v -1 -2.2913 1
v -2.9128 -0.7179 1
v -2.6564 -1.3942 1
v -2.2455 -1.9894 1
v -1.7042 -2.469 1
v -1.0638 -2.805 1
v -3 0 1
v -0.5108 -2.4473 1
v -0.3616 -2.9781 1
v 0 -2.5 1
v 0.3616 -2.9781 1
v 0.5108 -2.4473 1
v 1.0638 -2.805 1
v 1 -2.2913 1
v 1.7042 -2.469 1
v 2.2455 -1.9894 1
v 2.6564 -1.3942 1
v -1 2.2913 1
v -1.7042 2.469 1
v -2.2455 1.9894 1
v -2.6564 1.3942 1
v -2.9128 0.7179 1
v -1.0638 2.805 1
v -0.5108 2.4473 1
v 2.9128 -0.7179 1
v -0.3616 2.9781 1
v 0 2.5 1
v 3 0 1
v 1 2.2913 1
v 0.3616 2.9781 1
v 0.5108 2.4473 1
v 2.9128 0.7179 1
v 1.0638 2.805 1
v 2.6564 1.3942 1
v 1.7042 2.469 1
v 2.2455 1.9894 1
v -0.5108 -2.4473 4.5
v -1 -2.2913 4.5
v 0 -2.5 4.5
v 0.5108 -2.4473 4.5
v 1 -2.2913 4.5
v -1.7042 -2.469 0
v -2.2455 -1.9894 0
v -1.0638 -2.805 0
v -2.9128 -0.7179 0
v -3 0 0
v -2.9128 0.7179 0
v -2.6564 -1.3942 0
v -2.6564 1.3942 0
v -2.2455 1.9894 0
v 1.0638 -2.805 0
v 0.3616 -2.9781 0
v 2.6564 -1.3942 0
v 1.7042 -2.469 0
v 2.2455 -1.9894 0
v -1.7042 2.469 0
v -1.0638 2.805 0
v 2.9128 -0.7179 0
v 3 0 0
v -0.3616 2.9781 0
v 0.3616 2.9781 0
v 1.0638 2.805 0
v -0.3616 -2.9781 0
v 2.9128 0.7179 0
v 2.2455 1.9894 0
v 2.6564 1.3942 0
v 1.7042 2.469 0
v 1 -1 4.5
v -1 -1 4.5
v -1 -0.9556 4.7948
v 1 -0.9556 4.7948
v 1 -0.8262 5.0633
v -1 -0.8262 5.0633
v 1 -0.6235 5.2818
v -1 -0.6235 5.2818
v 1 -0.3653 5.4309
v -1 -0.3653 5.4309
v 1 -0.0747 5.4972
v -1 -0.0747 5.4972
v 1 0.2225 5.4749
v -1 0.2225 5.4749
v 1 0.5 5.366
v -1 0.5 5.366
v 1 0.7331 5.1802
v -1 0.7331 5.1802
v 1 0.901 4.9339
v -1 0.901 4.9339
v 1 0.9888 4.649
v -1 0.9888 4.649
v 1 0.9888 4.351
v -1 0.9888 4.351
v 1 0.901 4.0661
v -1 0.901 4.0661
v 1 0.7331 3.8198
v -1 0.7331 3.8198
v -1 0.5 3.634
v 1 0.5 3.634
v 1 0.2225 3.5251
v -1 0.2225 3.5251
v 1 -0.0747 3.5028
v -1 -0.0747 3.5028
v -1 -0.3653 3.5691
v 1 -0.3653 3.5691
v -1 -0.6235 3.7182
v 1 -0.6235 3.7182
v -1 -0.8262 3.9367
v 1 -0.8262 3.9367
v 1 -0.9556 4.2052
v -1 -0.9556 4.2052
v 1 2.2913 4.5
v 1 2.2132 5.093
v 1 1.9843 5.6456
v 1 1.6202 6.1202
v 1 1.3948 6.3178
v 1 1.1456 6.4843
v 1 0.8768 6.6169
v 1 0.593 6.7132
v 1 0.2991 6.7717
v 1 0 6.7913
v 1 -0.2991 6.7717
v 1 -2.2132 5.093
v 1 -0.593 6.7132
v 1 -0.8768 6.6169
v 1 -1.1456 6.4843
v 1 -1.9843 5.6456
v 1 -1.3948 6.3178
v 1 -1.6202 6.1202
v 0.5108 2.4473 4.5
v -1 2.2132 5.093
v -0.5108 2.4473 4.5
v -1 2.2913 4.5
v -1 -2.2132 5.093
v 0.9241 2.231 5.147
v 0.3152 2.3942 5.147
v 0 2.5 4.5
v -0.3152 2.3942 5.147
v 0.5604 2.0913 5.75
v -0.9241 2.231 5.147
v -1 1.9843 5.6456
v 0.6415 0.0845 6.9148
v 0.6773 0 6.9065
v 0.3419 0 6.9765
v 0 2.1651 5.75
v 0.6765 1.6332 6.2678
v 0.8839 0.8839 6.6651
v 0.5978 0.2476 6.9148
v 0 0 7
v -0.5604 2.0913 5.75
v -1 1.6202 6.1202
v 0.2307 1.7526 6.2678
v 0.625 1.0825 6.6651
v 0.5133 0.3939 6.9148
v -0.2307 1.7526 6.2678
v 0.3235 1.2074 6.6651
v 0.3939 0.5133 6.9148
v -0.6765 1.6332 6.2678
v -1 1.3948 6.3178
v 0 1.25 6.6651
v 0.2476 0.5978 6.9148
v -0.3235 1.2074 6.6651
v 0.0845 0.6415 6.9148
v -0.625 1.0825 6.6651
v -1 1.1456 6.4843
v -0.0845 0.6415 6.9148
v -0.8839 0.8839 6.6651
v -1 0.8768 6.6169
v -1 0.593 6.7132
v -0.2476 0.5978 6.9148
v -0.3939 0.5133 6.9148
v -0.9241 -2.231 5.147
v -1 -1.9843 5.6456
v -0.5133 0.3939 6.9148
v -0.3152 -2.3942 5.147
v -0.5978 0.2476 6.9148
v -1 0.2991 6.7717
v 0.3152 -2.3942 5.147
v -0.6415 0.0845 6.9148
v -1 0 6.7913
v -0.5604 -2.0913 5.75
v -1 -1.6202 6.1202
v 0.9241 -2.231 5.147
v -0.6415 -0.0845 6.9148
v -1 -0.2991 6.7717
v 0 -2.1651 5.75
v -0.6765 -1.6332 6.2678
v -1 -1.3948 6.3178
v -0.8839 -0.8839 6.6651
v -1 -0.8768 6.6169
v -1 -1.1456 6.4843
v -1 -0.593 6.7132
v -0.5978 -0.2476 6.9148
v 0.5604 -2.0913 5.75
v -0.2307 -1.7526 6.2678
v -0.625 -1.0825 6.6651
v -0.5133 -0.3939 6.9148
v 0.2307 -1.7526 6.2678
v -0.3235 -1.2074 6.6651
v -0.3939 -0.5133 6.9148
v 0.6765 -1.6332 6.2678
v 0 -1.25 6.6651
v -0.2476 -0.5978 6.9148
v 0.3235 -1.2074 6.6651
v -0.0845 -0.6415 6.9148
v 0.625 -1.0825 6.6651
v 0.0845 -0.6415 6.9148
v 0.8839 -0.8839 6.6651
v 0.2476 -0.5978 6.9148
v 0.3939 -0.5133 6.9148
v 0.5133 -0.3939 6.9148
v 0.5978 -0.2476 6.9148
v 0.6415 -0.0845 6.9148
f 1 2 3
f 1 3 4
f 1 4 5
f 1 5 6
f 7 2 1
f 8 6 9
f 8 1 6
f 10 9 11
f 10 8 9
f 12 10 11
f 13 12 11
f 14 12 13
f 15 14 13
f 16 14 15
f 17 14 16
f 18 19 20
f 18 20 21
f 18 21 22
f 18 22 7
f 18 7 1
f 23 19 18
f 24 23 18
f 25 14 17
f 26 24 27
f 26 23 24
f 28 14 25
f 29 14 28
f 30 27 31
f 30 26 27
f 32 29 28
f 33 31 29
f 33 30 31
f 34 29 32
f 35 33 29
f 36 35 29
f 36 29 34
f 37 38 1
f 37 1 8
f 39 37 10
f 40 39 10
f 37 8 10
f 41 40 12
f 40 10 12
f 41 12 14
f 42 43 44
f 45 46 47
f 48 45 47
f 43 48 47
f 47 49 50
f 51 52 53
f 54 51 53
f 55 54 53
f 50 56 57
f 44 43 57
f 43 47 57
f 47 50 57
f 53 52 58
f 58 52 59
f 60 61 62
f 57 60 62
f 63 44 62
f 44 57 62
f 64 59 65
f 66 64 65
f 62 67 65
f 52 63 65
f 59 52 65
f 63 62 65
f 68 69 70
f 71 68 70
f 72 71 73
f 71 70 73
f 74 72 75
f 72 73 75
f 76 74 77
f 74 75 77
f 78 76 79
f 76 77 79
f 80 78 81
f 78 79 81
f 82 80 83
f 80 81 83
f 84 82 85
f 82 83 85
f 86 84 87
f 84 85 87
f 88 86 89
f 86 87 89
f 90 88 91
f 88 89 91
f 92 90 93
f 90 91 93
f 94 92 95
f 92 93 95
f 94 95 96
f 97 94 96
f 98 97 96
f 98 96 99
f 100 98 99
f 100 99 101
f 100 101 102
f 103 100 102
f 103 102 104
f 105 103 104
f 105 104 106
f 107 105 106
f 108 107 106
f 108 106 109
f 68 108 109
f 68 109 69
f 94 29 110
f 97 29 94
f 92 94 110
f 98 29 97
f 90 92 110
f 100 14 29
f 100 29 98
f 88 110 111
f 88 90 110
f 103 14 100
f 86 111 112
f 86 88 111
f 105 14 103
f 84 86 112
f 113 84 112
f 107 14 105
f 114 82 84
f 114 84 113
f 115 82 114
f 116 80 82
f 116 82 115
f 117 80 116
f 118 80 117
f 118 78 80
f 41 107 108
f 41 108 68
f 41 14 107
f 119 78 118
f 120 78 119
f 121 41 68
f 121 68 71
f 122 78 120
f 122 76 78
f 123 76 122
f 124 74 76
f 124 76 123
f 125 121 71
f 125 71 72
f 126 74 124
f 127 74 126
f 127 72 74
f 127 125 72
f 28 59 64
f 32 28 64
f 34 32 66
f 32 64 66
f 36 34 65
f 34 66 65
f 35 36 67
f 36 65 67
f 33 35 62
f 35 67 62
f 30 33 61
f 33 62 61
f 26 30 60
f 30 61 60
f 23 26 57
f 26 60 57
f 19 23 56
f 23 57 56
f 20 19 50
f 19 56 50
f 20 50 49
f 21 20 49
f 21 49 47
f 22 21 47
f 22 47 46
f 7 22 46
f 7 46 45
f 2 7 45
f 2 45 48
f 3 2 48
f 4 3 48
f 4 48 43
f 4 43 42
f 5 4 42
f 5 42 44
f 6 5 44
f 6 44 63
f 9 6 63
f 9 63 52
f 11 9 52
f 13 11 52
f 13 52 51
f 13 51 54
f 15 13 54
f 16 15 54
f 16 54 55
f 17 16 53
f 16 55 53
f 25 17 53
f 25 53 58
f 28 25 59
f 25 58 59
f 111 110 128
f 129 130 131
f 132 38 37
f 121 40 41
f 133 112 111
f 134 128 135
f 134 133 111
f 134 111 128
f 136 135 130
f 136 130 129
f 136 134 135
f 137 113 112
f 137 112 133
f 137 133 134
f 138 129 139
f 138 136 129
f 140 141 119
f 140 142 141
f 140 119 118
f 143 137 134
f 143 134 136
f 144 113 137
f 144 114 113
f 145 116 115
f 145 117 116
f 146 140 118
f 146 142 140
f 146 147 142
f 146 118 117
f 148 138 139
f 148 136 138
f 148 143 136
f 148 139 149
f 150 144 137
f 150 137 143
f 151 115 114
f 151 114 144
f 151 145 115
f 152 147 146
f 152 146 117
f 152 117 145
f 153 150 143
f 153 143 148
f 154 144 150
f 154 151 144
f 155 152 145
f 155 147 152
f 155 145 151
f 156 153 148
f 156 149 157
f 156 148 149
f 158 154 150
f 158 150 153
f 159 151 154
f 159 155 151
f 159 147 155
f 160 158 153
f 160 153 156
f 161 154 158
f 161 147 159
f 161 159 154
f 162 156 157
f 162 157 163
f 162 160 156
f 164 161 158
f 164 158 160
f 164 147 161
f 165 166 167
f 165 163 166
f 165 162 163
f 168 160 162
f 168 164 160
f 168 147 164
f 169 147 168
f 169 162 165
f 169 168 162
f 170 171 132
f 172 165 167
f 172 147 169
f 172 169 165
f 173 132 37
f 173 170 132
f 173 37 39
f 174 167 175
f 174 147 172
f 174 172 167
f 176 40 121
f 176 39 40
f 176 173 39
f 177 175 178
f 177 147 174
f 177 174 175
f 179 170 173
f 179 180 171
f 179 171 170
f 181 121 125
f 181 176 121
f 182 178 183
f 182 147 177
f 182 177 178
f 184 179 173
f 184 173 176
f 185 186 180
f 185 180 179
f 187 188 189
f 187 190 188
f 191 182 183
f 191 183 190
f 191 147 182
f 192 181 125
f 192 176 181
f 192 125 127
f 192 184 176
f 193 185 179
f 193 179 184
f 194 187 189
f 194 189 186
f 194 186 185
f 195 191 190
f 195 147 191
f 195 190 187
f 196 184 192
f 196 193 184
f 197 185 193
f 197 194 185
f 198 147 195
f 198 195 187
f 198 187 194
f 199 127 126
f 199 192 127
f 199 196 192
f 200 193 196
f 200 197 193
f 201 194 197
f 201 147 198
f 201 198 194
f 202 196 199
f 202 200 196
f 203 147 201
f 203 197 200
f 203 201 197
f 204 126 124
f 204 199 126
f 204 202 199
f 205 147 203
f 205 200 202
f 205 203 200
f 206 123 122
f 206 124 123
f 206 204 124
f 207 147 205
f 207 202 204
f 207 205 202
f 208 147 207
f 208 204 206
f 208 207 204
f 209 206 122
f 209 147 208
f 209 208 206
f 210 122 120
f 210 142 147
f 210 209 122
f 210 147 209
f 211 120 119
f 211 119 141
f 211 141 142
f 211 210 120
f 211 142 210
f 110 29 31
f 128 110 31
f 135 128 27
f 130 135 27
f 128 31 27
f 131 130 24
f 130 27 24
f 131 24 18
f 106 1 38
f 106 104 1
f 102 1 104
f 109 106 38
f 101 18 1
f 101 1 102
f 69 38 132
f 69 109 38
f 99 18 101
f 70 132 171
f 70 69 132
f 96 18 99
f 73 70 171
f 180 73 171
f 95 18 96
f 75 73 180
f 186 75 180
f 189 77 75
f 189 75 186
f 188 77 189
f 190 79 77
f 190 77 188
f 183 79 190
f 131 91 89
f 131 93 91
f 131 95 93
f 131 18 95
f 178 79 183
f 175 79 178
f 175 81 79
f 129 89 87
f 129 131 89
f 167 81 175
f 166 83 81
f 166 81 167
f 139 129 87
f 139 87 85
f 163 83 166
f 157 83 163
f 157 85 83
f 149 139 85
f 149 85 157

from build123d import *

# Parameters (mm, degrees)
F0_R     = 3
F1_DEPTH = 1
F2_R     = 2.5
F3_DEPTH = 6
F4_R     = 2.5
F5_W     = 1.9698908329
F5_H     = 6.6161441393
F5_W_2   = 2.2700465526
F6_DEPTH = 12.5
F7_R     = 1
F8_DEPTH = 4.001


with BuildPart() as f1:
    # F0 (on Top) → F1 (new body)
    with BuildSketch(Plane.XY):
        Circle(F0_R)
    extrude(amount=F1_DEPTH)

    # F2 (on face) → F3 (join)
    with BuildSketch(Plane.XY.offset(1)):
        Circle(F2_R)
    extrude(amount=F3_DEPTH)

    # F4
    f4_edges = [f1.edges().sort_by_distance(p)[0] for p in [
        (-2.5, 0, 7),
    ]]
    fillet(f4_edges, radius=F4_R)

    # F5 (on Front) → F6 (cut, symmetric)
    with BuildSketch(Plane.XZ):
        with Locations((-1.9849454165, 4.3080720697)):
            Rectangle(F5_W, F5_H)
        with Locations((2.1350232763, 4.3080720697)):
            Rectangle(F5_W_2, F5_H)
    extrude(amount=F6_DEPTH, both=True, mode=Mode.SUBTRACT)

    # F7 (on face) → F8 (cut, through all)
    with BuildSketch(Plane(origin=(-1, 0, 0), x_dir=(0, -1, 0), z_dir=(-1, 0, 0))):
        with Locations((0, 4.5)):
            Circle(F7_R)
    extrude(amount=-F8_DEPTH, mode=Mode.SUBTRACT)


solid = f1.part
